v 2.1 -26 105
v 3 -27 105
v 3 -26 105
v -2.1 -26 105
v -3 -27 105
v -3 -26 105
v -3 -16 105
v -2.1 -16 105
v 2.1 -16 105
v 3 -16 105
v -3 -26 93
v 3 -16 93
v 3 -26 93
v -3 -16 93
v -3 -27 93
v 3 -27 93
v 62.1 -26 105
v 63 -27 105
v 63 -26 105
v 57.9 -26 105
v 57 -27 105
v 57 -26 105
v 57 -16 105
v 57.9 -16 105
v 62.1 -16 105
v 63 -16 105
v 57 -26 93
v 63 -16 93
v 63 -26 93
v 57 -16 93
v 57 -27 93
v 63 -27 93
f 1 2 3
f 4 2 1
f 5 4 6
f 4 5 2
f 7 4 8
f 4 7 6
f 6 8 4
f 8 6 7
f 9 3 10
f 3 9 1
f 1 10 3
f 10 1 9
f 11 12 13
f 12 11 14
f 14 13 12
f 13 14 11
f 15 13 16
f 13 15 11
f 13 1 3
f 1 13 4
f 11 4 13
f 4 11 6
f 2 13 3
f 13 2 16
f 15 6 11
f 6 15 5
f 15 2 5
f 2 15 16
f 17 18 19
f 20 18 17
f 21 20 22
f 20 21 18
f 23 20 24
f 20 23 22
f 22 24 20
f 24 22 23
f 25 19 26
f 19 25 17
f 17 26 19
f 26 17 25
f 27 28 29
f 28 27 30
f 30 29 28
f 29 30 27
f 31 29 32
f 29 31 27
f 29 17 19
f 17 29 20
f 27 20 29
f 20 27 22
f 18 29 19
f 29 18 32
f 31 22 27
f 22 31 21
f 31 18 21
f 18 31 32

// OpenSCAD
// file: ../stage.scad
// ============================================================
//  Positioning stage: base (X dovetail) -> x-slider with column
//  (Z dovetail) -> z-slider (payload face toward +Y) + column cap.
//  Every axis: M3 adjust screw captured in the fixed part by head +
//  nylock, threading into a captive nut in the moving part
//  (0.5 mm/turn, both directions), plus an M3 lock screw.
//  Modules model parts in stage-local coordinates at mid travel.
// ============================================================
include <lib.scad>

// Dovetail standing on the column's +Y face, running along Z.
// multmatrix maps (x,y,z) -> (y,z,x): run->Z, width->X, height->Y.
module zrail_frame() { multmatrix([[0,1,0,0],[0,0,1,0],[1,0,0,0]]) children(); }

module stage_base() {
    rail_x0 = -stage_L / 2;
    rail_len = stage_L - stage_tab_t;
    tab_h = stage_base_h + xs_screw_z + 6;
    difference() {
        union() {
            translate([-stage_L / 2, -stage_D / 2, 0]) cube([stage_L, stage_D, stage_base_h]);
            translate([rail_x0, 0, stage_base_h]) dovetail_rail(rail_len);
            // adjust-screw tab
            translate([stage_L / 2 - stage_tab_t, -8, 0]) cube([stage_tab_t, 16, tab_h]);
        }
        wood_screw_holes(stage_mount_pts, stage_base_h, cbore = 3);
        // X adjust screw through tab (head outside, nylock inside)
        translate([stage_L / 2 - stage_tab_t - 1, 0, stage_base_h + xs_screw_z])
            rotate([0, 90, 0]) screw_hole(m3_d, stage_tab_t + 2);
    }
}

// Upper stack shares the x-slider's X offset.
module stage_x_slider() {
    x0 = xs_xc - xs_len / 2;
    difference() {
        union() {
            translate([x0, -xs_w / 2, stage_base_h]) cube([xs_len, xs_w, xs_h]);
            // column
            translate([xs_xc - col_w / 2, col_y0, xs_top - 0.01]) cube([col_w, col_t, col_h + 0.01]);
            translate([xs_xc, col_y1, xs_top]) zrail_frame() dovetail_rail(col_h);
        }
        translate([x0 - 1, 0, stage_base_h]) dovetail_slot(xs_len + 2);
        // X adjust: screw enters +X face, nut dropped in from the top
        translate([x0 + xs_len + 0.01, 0, stage_base_h + xs_screw_z]) rotate([0, -90, 0])
            screw_hole(m3_d, xs_adj_hole);
        translate([x0 + xs_len - 6 - m3_nut_t / 2, -(m3_nut_af + clr) / 2, stage_base_h + xs_screw_z - 3.5])
            cube([m3_nut_t + 0.4, m3_nut_af + clr, xs_h]);
        // X lock: horizontal from +Y face onto rail flank, nut from top
        translate([xs_xc + 8, xs_w / 2 + 0.01, stage_base_h + 2.5]) rotate([90, 0, 0])
            screw_hole(m3_d, xs_w / 2 - 3);
        translate([xs_xc + 8 - (m3_nut_af + clr) / 2, 9 - (m3_nut_t + 0.4) / 2, stage_base_h + 2.5 - 3.3])
            cube([m3_nut_af + clr, m3_nut_t + 0.4, xs_h]);
        // cap screws (tapped into column top)
        for (sx = [-8, 8]) translate([xs_xc + sx, col_y0 + 5, col_top - 10])
            screw_hole(m3_tap, 10.1);
    }
}

module stage_z_slider() {
    y0 = col_y1;
    x0 = xs_xc - zs_w / 2;
    difference() {
        translate([x0, y0, zs_z0]) cube([zs_w, zs_t, zs_h]);
        translate([xs_xc, col_y1, zs_z0 - 1]) zrail_frame() dovetail_slot(zs_h + 2);
        // payload holes + nut slots from the bottom
        for (p = payload_pts) {
            translate([xs_xc + p[0], payload_face_y + 0.01, stage_payload_z + p[1]])
                rotate([90, 0, 0]) screw_hole(m3_d, 7.5);
            translate([xs_xc + p[0] - (m3_nut_af + clr) / 2, payload_face_y - 4 - (m3_nut_t + 0.4) / 2, zs_z0 - 1])
                cube([m3_nut_af + clr, m3_nut_t + 0.4, zs_h / 2 + 1 + 3.3]);
        }
        // Z adjust: through hole, nut slot from the -X side 5 below the top
        translate([xs_xc + zs_screw_x, zs_screw_y, zs_z0 + zs_h - zs_adj_hole]) screw_hole(m3_d, zs_adj_hole + 0.1);
        translate([x0 - 1, zs_screw_y - (m3_nut_af + clr) / 2, zs_z0 + zs_h - 5 - (m3_nut_t + 0.4) / 2])
            cube([zs_screw_x + zs_w / 2 + 1 + (m3_nut_af + clr) / 2, m3_nut_af + clr, m3_nut_t + 0.4]);
        // Z lock: from the +X (outward) side onto the rail flank, nut dropped in from the top
        lz = zs_z0 + zs_h - 5;
        x1 = x0 + zs_w;
        translate([x1 + 0.01, col_y1 + 2, lz]) rotate([0, -90, 0]) screw_hole(m3_d, zs_w / 2 - 4);
        translate([x1 - 2.5 - (m3_nut_t + 0.4), col_y1 + 2 - zl_pocket_w / 2, lz - (m3_nut_af + clr) / 2 / cos(30)])
            cube([m3_nut_t + 0.4, zl_pocket_w, zs_h]);
    }
}

module stage_z_cap() {
    difference() {
        // stops 1 mm short of the payload face so the payload never rubs it
        translate([xs_xc - col_w / 2, col_y0, col_top]) cube([col_w, payload_face_y - col_y0 - 1, cap_t]);
        for (sx = [-8, 8]) translate([xs_xc + sx, col_y0 + 5, col_top]) screw_hole(m3_d, cap_t);
        translate([xs_xc + zs_screw_x, zs_screw_y, col_top]) screw_hole(m3_d, cap_t);
    }
}

// ---- placed at a fine-travel offset (dx, dz) ----
module stage_x_slider_placed(dx = 0) { translate([dx, 0, 0]) stage_x_slider(); }
module stage_z_cap_placed(dx = 0)    { translate([dx, 0, 0]) stage_z_cap(); }
module stage_z_slider_placed(dx = 0, dz = 0) { translate([dx, 0, dz]) stage_z_slider(); }

// Children placed at the payload face centre (origin on the face, +Y out).
module stage_payload_origin(dx = 0, dz = 0) {
    translate([xs_xc + dx, payload_face_y, stage_payload_z + dz]) children();
}

// Optional mirror (tower B) wraps the stage-local geometry.
module stage_hand(mir) { if (mir) mirror([1, 0, 0]) children(); else children(); }

module stage_assembly(dx = 0, dz = 0) {
    color("SteelBlue") stage_base();
    color("LightSteelBlue") stage_x_slider_placed(dx);
    color("SkyBlue") stage_z_cap_placed(dx);
    color("CadetBlue") stage_z_slider_placed(dx, dz);
}

// ---- travel checks ----
_right_gap = (stage_L / 2 - stage_tab_t) - (xs_xc + xs_len / 2) - locknut_t;
_left_ok   = 10;   // slider may overhang the rail start by up to 10 mm
echo("CHECK", "stage_travel_x", 2 * min(_right_gap, _left_ok));
// adjust screws: head on the fixed tab/cap, tip must pass the moving nut
// at the far travel end and stay inside the hole at the near end
_xnut = xs_xc + xs_len / 2 - 6;                  // nut centre X at mid
_xtip = stage_L / 2 - x_adj_len;
echo("CHECK", "x_adj_engage", (_xnut - stage_travel - (m3_nut_t + 0.4) / 2) - _xtip);
echo("CHECK", "x_adj_hole", _xtip - (xs_xc + xs_len / 2 + stage_travel - xs_adj_hole));
_znut = zs_z0 + zs_h - 5;
_ztip = stage_top_z - z_adj_len;
echo("CHECK", "z_adj_engage", (_znut - stage_travel - (m3_nut_t + 0.4) / 2) - _ztip);
echo("CHECK", "z_adj_hole", _ztip - (zs_z0 + zs_h + stage_travel - zs_adj_hole));
echo("CHECK", "z_lock_pocket_w", zl_pocket_w);
echo("CHECK", "stage_travel_z", 2 * min(stage_gap_z, cap_gap - locknut_t));
// file: ../axes.scad
// ============================================================
//  Plug carriage: X base (fixed, X servo) -> X carriage (rack on
//  its -Y face, Y servo) -> Y carriage (rack on its -X face, male
//  stage pad, cable pillar).
//  World coords; carriage modules take x_pos (plug X) / y_pos.
// ============================================================
include <stage.scad>

runner_w = 10;     // plain (non-dovetail) rear X runner
runner_h = dt_h;

// ---------------- X base ----------------
xb_x0 = x_rail_x0 - 6;
xb_x1 = x_rail_x0 + x_rail_len + 6;
xb_y0 = x_shaft_y - servo_body[0] + servo_shaft_off - 12;
xb_y1 = xc_y1;
xb_screws = [[xb_x0 + 7, xb_y0 + 7], [xb_x1 - 7, xb_y0 + 7],
             [xb_x0 + 7, xb_y1 - 7], [xb_x1 - 7, xb_y1 - 7],
             [(xb_x0 + xb_x1) / 2, xb_y1 - 7]];

module x_servo_holder_world() {
    at_inverted_servo(x_shaft_x, x_shaft_y, x_pinion_z0, 90) mg995_holder();
}
// Holder floor-screw holes, mapped from the holder frame to the floor.
module x_holder_floor_holes() {
    at_inverted_servo(x_shaft_x, x_shaft_y, x_pinion_z0, 90) translate([0, 0, holder_floor_up])
        mirror([0, 0, 1]) translate([0, 0, -xb_t]) holder_floor_holes(xb_t);
}
module x_servo_world() {
    at_inverted_servo(x_shaft_x, x_shaft_y, x_pinion_z0, 90) mg995_model();
    x_servo_holder_world();
}
module x_pinion_world() {
    translate([x_shaft_x, x_shaft_y, x_pinion_z0]) color("Gold") pinion();
}

module x_base() {
    difference() {
        union() {
            translate([xb_x0, xb_y0, 0]) cube([xb_x1 - xb_x0, xb_y1 - xb_y0, xb_t]);
            translate([x_rail_x0, x_rail_y[1], xb_t]) dovetail_rail(x_rail_len);
            translate([x_rail_x0, x_rail_y[0] - runner_w / 2, xb_t - 0.01])
                cube([x_rail_len, runner_w, runner_h + 0.01]);
        }
        wood_screw_holes(xb_screws, xb_t, cbore = 2);
        x_holder_floor_holes();
        // pinion clearance pocket (keeps the plate clear of the gear)
        translate([x_shaft_x, x_shaft_y, xb_t - 1]) cylinder(r = pinion_pd / 2 + gear_mod + 1, h = 2);
        // servo-lead exit notch at the rear edge, plus zip-tie slots
        translate([x_shaft_x - 6, xb_y0 - 1, -1]) cube([12, 8, xb_t + 2]);
        for (dx = [-10, 10]) translate([x_shaft_x + dx - 1.5, xb_y0 + 12, -1]) cube([3, 5, xb_t + 2]);
    }
}

// ---------------- X carriage (modelled at x_pos = 0) ----------------
module y_servo_holder_local() {
    at_inverted_servo(y_shaft_x_rel, y_shaft_y, y_pinion_z0, 90) mg995_holder();
}
module y_holder_floor_holes() {
    at_inverted_servo(y_shaft_x_rel, y_shaft_y, y_pinion_z0, 90) translate([0, 0, holder_floor_up])
        mirror([0, 0, 1]) translate([0, 0, -xc_h]) holder_floor_holes(xc_h);
}
module y_servo_local() {
    at_inverted_servo(y_shaft_x_rel, y_shaft_y, y_pinion_z0, 90) mg995_model();
}

module x_carriage() {
    difference() {
        union() {
            translate([xc_x0, xc_y0, xc_z0]) cube([xc_len, xc_y1 - xc_y0, xc_h]);
            // X rack on the -Y face, teeth toward -Y
            translate([xc_x0, xc_y0 + 0.01, x_rack_z0]) mirror([0, 1, 0]) rack(xc_len, base_h = rack_base);
            // Y rail on top, under the Y carriage
            translate([-xs_xc, xc_y0, xc_top]) rotate([0, 0, 90]) dovetail_rail(xc_y1 - xc_y0);
        }
        y_holder_floor_holes();
        translate([xc_x0 - 1, x_rail_y[1], xc_z0]) dovetail_slot(xc_len + 2);
        translate([xc_x0 - 1, x_rail_y[0] - runner_w / 2 - clr - 0.15, xc_z0 - 1])
            cube([xc_len + 2, runner_w + 2 * clr + 0.3, runner_h + clr + 1]);
        translate([xc_x0 - 1, x_rail_y[0], xc_z0]) rotate([90, 0, 90]) linear_extrude(xc_len + 2)
            chamfer_mouth(runner_w + 2 * clr + 0.3);
        // lightening / Y-servo lead pass-through + zip-tie slots
        translate([y_shaft_x_rel - 6, xc_y0 + 3, xc_top - 4]) cube([12, 6, 5]);
        for (dy = [12, 24]) translate([xc_x0 + 3, xc_y0 + dy, xc_z0 + runner_h + 2]) cube([5, 3, xc_h]);
    }
}
module x_carriage_world(x_pos) { translate([x_pos, 0, 0]) x_carriage(); }
module y_servo_world(x_pos) { translate([x_pos, 0, 0]) { y_servo_local(); y_servo_holder_local(); } }
module y_pinion_world(x_pos) {
    translate([x_pos + y_shaft_x_rel, y_shaft_y, y_pinion_z0]) color("Gold") pinion();
}

echo("CHECK", "x_rail_len", x_rail_len);
// X base front edge to the port towers' base front edge (Y)
echo("CHECK", "xbase_tower_gap", (tower_y - stage_D / 2) - xb_y1);
echo("CHECK", "x_mesh_gap", (x_pitch_y - x_shaft_y) - pinion_pd / 2);
echo("CHECK", "x_travel_needed", x_pos_max - x_pos_min);

// ---------------- Y carriage (coords relative to male stage origin
//                  in X/Y, world Z) ----------------
pillar_w   = 16;
// top of the flexure frame (mirrors plug_mount.scad) + 6 so the cable clears it
pillar_top = port_z + plug_drop - 1 + flex_isl_h + 6 + 5 + 6;

module y_carriage() {
    difference() {
        union() {
            translate([yc_x0, yc_y0, yc_z0]) cube([yc_x1 - yc_x0, yc_len, yc_h]);
            // Y rack on the -X face, teeth toward -X
            translate([yc_x0 + 0.01, yc_y0, y_rack_z0]) rotate([0, 0, 90]) rack(yc_len, base_h = rack_base);
            // cable strain-relief pillar at the rear, in line with the plug
            translate([xs_xc - pillar_w / 2, yc_y0, yc_z0]) cube([pillar_w, yc_pillar_d, pillar_top - yc_z0]);
        }
        translate([0, yc_y0 - 1, yc_z0]) rotate([0, 0, 90]) dovetail_slot(yc_len + 2);
        // M4 bolts up through captive nuts into the stage base
        for (p = stage_mount_pts) translate([p[0], p[1], yc_z0]) {
            screw_hole(m4_d, yc_h);
            translate([0, 0, -0.01]) m4_nut_trap(m4_nut_t + 0.5);
        }
        // two zip-tie slots through the pillar, near its front face
        for (dz = [6, 18]) translate([xs_xc - pillar_w / 2 - 1, yc_y0 + yc_pillar_d - 5.5, pillar_top - dz])
            cube([pillar_w + 2, 3, 5]);
    }
}
module y_carriage_world(x_pos, y_pos) {
    o = ms_origin(x_pos, y_pos);
    translate([o[0], o[1], 0]) y_carriage();
}

echo("CHECK", "m4_stage_bolt_protrude", m4_stage_bolt_len - ((stage_base_h - 3) + yc_h));
echo("CHECK", "y_mesh_gap", ((y_pitch_x_rel - xs_xc) - y_shaft_x_rel) - pinion_pd / 2);
echo("CHECK", "pillar_top_z", pillar_top);
echo("CHECK", "pillar_min", port_z + 25);
// rack length left past the pinion centre at the worst travel end
echo("CHECK", "x_rack_engage_min",
     min(x_shaft_x - (x_pos_max + xc_x0), (x_pos_min + xc_x1) - x_shaft_x));
echo("CHECK", "y_rack_engage_min",
     min(y_shaft_y - (ms_origin(0, y_travel)[1] + yc_y0), (ms_origin(0, 0)[1] + yc_y1) - y_shaft_y));
// file: ../port_tower.scad
// ============================================================
//  Female port tower: positioning stage (rotated 180 deg so its
//  payload face looks toward -Y) + bracket plate with the keyed
//  D-hole. The bulkhead goes in from the back (flange behind the
//  plate), nut on the front. Plate front face is at world y=0.
// ============================================================
include <stage.scad>

bracket_w      = 36;
bracket_hole_dz = port_z - stage_payload_z;   // hole above payload centre
bracket_bot    = -zs_h / 2;
bracket_top    = bracket_hole_dz + bh_nut_af / cos(30) / 2 + 3;
rib_t          = 5;     // rib width (X)
rib_d          = 7;     // rib depth (out of the plate front)

// Payload-face coordinates: origin at face centre, +Y away from the stage.
module port_bracket() {
    difference() {
        union() {
            translate([-bracket_w / 2, 0, bracket_bot]) cube([bracket_w, plate_t, bracket_top - bracket_bot]);
            // stiffening ribs, outboard of the nut and clear of the plug clamp
            for (sx = [-1, 1])
                translate([sx > 0 ? bracket_w / 2 - rib_t : -bracket_w / 2, plate_t - 0.01, bracket_bot])
                    hull() {
                        cube([rib_t, rib_d, 1]);
                        translate([0, 0, bracket_hole_dz - 14]) cube([rib_t, 0.01, 1]);
                    }
        }
        // keyed D-hole, flat on top
        translate([0, plate_t, bracket_hole_dz]) rotate([90, 0, 0]) d_hole(t = plate_t);
        // mounting screws into the z-slider's captive nuts
        for (p = payload_pts) translate([p[0], -0.01, p[1]]) rotate([-90, 0, 0]) {
            screw_hole(m3_d, plate_t + rib_d);
        }
    }
}

// Whole tower in world coordinates at fine-travel offset (dx, dz),
// measured in world X / Z.
// Tower B (i=1) is the mirror image so its X adjust screw faces outward.
module port_tower_world(i, dx = 0, dz = 0) {
    ldx = i == 0 ? -dx : dx;   // world dx -> stage-local dx
    translate([tower_x(i), tower_y, 0]) rotate([0, 0, 180]) stage_hand(i == 1) {
        stage_assembly(ldx, dz);
        stage_payload_origin(ldx, dz) color("Orange") port_bracket();
    }
}

// Bulkhead connector stand-in (for checks / preview), world coords.
module bulkhead_world(i, dx = 0, dz = 0) {
    translate([port_x[i] + dx, port_face_y, port_z + dz]) rotate([90, 0, 0]) color("DimGray") {
        cylinder(d = bh_thread_d, h = bh_thread_len - plate_t);                   // thread + face
        cylinder(d = bh_nut_af / cos(30), h = bh_nut_t, $fn = 6);                  // nut
        translate([0, 0, -plate_t - 2]) cylinder(d = bh_flange_d, h = 2);          // flange
        translate([0, 0, -plate_t - 40]) cylinder(d = 14, h = 38);                 // body
    }
}

echo("CHECK", "port_z", port_z);
// file: ../plug_mount.scad
// ============================================================
//  Male plug mount: flexure (frame + 4 L-beams + floating island with
//  the clamp cradle built in), clamp cap, and two identical stop
//  straps (front + back) whose pins limit X/Z float to +/-flex_float
//  and whose 1 mm standoff limits Y float to +/-flex_stop_gap.
//  Local coords: origin at the stage payload face centre, +Y away from
//  the stage, Z relative to the payload centre.
// ============================================================
include <port_tower.scad>
include <axes.scad>

plug_dz  = port_z - (yc_top + stage_payload_z);   // plug centre above payload centre
blk_x    = plug_bx / 2 + 0.1;           // snug in X
blk_y0   = flex_t + clamp_wall;                   // block back face
blk_y1   = blk_y0 + plug_by;                // block front face
blk_z0   = plug_dz + plug_drop;                   // block bottom
blk_z1   = blk_z0 + plug_block[2];
crad_x   = blk_x + 5;                             // cradle half width
crad_y1  = blk_y1 - 0.4;                          // cradle stops short: cap clamps the block
cap_back_y = crad_y1;
crad_scr = blk_x + 2.5;                           // cradle screw X
clamp_ledge = 0.5;                                // keeps clamp >= 12.5 above plug centre

isl_x    = 19;                                    // island half width
isl_z0   = blk_z0 - 1;
isl_z1   = isl_z0 + flex_isl_h;
flex_g   = 6;                                     // island-to-frame gap
in_x     = isl_x + flex_g;
in_z0    = isl_z0 - flex_g;
in_z1    = isl_z1 + flex_g;
fr_bar   = 5;
fr_x     = in_x + fr_bar;
fr_z0    = -zs_h / 2;
fr_z1    = in_z1 + fr_bar;

pin_d    = 4;
pin_z    = isl_z1 - 4;
pin_hole = pin_d + 2 * flex_float;
strap_w  = 8;
strap_t  = 3;
strap_foot_w = 18;
strap_z0 = pin_z - 4;
strap_scr = [-5, 5];                              // strap screw X (through the top bar)
strap_scr_z = (in_z1 + fr_z1) / 2;

// one L-beam: island bottom face -> down -> outward -> up -> frame side
leg = 3;
function beam_path(sx, sz) = let(zc = (isl_z0 + isl_z1) / 2,
    zi = sz < 0 ? isl_z0 : isl_z1,
    zh = zi + sz * leg,
    zv = zc + sz * (flex_g - 2 + 0.5),
    xv = sx * (isl_x + leg))
    [[sx * 10, zi], [sx * 10, zh], [xv, zh], [xv, zv], [sx * in_x, zv]];

module poly_beam(pts, w) {
    for (k = [0:len(pts) - 2]) hull() {
        translate(pts[k]) square(w, center = true);
        translate(pts[k + 1]) square(w, center = true);
    }
}

// XZ outline helpers: 2D (x, z) extruded along +Y from y0, thickness t
module xz_extrude(y0, t) { translate([0, y0 + t, 0]) rotate([90, 0, 0]) linear_extrude(t) children(); }

module plug_flexure() {
    difference() {
        union() {
            xz_extrude(0, flex_t) {
                difference() {
                    translate([-fr_x, fr_z0]) square([2 * fr_x, fr_z1 - fr_z0]);
                    translate([-in_x, in_z0]) square([2 * in_x, in_z1 - in_z0]);
                }
                translate([-isl_x, isl_z0]) square([2 * isl_x, isl_z1 - isl_z0]);
                for (sx = [-1, 1], sz = [-1, 1]) poly_beam(beam_path(sx, sz), flex_beam_w);
            }
            // clamp cradle on the island front: back wall + side walls
            translate([-crad_x, flex_t - 0.01, blk_z0]) cube([2 * crad_x, clamp_wall + 0.01, plug_block[2]]);
            for (sx = [-1, 1]) translate([sx > 0 ? blk_x : -crad_x, blk_y0 - 0.01, blk_z0])
                cube([crad_x - blk_x, crad_y1 - blk_y0 + 0.01, plug_block[2]]);
            // Z retention: thin ledge under the block, lips over its top corners
            translate([-crad_x, blk_y0 - 0.01, blk_z0 - clamp_ledge]) cube([2 * crad_x, crad_y1 - blk_y0 + 0.01, clamp_ledge]);
            for (sx = [-1, 1]) translate([sx > 0 ? blk_x - 1 : -crad_x, blk_y0 - 0.01, blk_z1])
                cube([crad_x - blk_x + 1, crad_y1 - blk_y0 + 0.01, 1.5]);
        }
        // payload screws into the stage z-slider
        for (p = payload_pts) translate([p[0], -0.01, p[1]]) rotate([-90, 0, 0]) screw_hole(m3_d, flex_t);
        // stop-pin hole (through) and strap screws (through the top bar)
        translate([0, -0.01, pin_z]) rotate([-90, 0, 0]) screw_hole(pin_hole, flex_t);
        for (x = strap_scr) translate([x, -0.01, strap_scr_z]) rotate([-90, 0, 0]) screw_hole(m3_d, flex_t);
        // cap screws, tapped into the cradle side walls
        for (sx = [-1, 1]) translate([sx * crad_scr, crad_y1 + 0.01, (blk_z0 + blk_z1) / 2])
            rotate([90, 0, 0]) screw_hole(m3_tap, crad_y1 - flex_t + 1);
    }
}

// Clamp cap: 1.5 mm over the block, thicker over the screws.
module plug_clamp_cap() {
    // flat back at the cradle front: squeezes the block (it stands 0.4 proud)
    difference() {
        union() {
            translate([-crad_x, cap_back_y, blk_z0]) cube([2 * crad_x, blk_y1 - cap_back_y + clamp_lip_t, plug_block[2]]);
            for (sx = [-1, 1]) translate([sx > 0 ? blk_x : -crad_x, cap_back_y, blk_z0])
                cube([crad_x - blk_x, 4, plug_block[2]]);
        }
        for (sx = [-1, 1]) translate([sx * crad_scr, cap_back_y - 0.01, (blk_z0 + blk_z1) / 2])
            rotate([-90, 0, 0]) screw_hole(m3_d, 5);
    }
}

// Stop strap in its own frame: back face on y=0, pin toward -Y.
module plug_flex_stop() {
    difference() {
        union() {
            translate([-strap_w / 2, 0, strap_z0]) cube([strap_w, strap_t, fr_z1 - strap_z0]);
            translate([-strap_foot_w / 2, -flex_stop_gap, in_z1]) cube([strap_foot_w, strap_t + flex_stop_gap, fr_z1 - in_z1]);
            translate([0, 0.01, pin_z]) rotate([90, 0, 0]) cylinder(d = pin_d, h = flex_stop_gap + 2);
        }
        for (x = strap_scr) translate([x, -flex_stop_gap - 0.01, strap_scr_z]) rotate([-90, 0, 0])
            screw_hole(m3_d, strap_t + flex_stop_gap);
    }
}

module plug_flex_stops_placed() {
    translate([0, flex_t + flex_stop_gap, 0]) plug_flex_stop();                       // front
    translate([0, -flex_stop_gap, 0]) mirror([0, 1, 0]) plug_flex_stop();            // back
}

module plug_body_local() {
    color("White") {
        translate([-plug_bx / 2, blk_y0, blk_z0]) cube([plug_bx, plug_by, plug_block[2]]);
        translate([0, blk_y0 + plug_by / 2, blk_z1]) cylinder(d = 4.5, h = 15);              // cable
        hull() {
            translate([-plug_bx / 2, blk_y0, plug_dz - 4]) cube([plug_bx, plug_by, blk_z0 - plug_dz + 4]);
            translate([0, blk_y1 + plug_head_proj - 1, plug_dz]) rotate([-90, 0, 0]) cylinder(d = 8, h = 1);
        }
    }
}

// Everything that moves with the plug carriage, minus the plug itself.
module plug_mount_world(x_pos, y_pos, dx = 0, dz = 0) {
    o = ms_origin(x_pos, y_pos);
    translate(o) {
        stage_assembly(dx, dz);
        stage_payload_origin(dx, dz) {
            color("Orange") plug_flexure();
            color("Gold") plug_clamp_cap();
            color("Khaki") plug_flex_stops_placed();
        }
    }
}
module plug_body_world(x_pos, y_pos, dx = 0, dz = 0) {
    o = ms_origin(x_pos, y_pos);
    translate(o) stage_payload_origin(dx, dz) plug_body_local();
}

// ---- checks ----
echo("CHECK", "clamp_lip_t", clamp_lip_t);
echo("CHECK", "clamp_preload", blk_y1 - cap_back_y);
echo("CHECK", "clamp_x_play", blk_x - plug_bx / 2);
echo("CHECK", "pillar_above_flex", pillar_top - (yc_top + stage_payload_z + fr_z1));
echo("CHECK", "clamp_bottom_above_plug", blk_z0 - clamp_ledge - plug_dz);
echo("CHECK", "plug_insert_err",
     (ms_origin(0, y_travel)[1] + payload_face_y + blk_y1 + plug_head_proj) - bh_face_y);
echo("CHECK", "flex_xz_stop", (pin_hole - pin_d) / 2);
// beam-to-island and beam-to-frame clearance must exceed the stop travel
echo("CHECK", "flex_beam_clear", leg - flex_beam_w / 2);
// file: ../assembly_lib.scad
// World-placement groups shared by assembly.scad and the full-machine
// collision test. Pinions are left out of these groups because they
// mesh with the racks by design.
include <plug_mount.scad>

module fixed_world() {
    for (i = [0, 1]) { port_tower_world(i); bulkhead_world(i); }
    color("Tan") x_base();
    x_servo_world();
}

module moving_world(x_pos, y_pos) {
    color("LightGreen") x_carriage_world(x_pos);
    y_servo_world(x_pos);
    color("Yellow") y_carriage_world(x_pos, y_pos);
    plug_mount_world(x_pos, y_pos);
}
// file: probe_lib.scad
// Fit probes built only from the port position and the measured part
// sizes (not from the bracket / clamp variables), so they test the real
// geometry rather than restating its formulas.
include <../assembly_lib.scad>

// Bulkhead thread cross-section (15 mm, flat 6.5 mm from centre, on top)
// pushed through port i's plate, offset by d = [dx, dz].
module probe_port_thread(i, d) {
    translate([port_x[i] + d[0], port_face_y + plate_t + 1, port_z + d[1]]) rotate([90, 0, 0])
        linear_extrude(plate_t + 2) intersection() {
            circle(d = bh_thread_d, $fn = 96);
            translate([-bh_thread_d, -bh_thread_d]) square([2 * bh_thread_d, bh_thread_d + bh_flat]);
        }
}
module probe_port_hole(d) {
    for (i = [0, 1]) intersection() { port_tower_world(i); probe_port_thread(i, d); }
}

// Plug clamp block where it must sit for the magnetic face to meet port
// i's face: face centre at (port_x, bh_face_y, port_z).
module probe_block(i, d) {
    translate([port_x[i] - plug_bx / 2 + d[0],
               bh_face_y - plug_head_proj - plug_by + d[1],
               port_z + plug_drop + d[2]])
        cube([plug_bx, plug_by, plug_block[2]]);
}
// Seat = flexure cradle only (the cap squeezes the block on purpose).
module probe_plug_seat(d) {
    for (i = [0, 1]) intersection() {
        translate(ms_origin(port_x[i], y_travel)) stage_payload_origin() plug_flexure();
        probe_block(i, d);
    }
}
// main file
// 1 mm back: must hit the cradle back wall.
include <probe_lib.scad>
probe_plug_seat([0, -1, 0]);
